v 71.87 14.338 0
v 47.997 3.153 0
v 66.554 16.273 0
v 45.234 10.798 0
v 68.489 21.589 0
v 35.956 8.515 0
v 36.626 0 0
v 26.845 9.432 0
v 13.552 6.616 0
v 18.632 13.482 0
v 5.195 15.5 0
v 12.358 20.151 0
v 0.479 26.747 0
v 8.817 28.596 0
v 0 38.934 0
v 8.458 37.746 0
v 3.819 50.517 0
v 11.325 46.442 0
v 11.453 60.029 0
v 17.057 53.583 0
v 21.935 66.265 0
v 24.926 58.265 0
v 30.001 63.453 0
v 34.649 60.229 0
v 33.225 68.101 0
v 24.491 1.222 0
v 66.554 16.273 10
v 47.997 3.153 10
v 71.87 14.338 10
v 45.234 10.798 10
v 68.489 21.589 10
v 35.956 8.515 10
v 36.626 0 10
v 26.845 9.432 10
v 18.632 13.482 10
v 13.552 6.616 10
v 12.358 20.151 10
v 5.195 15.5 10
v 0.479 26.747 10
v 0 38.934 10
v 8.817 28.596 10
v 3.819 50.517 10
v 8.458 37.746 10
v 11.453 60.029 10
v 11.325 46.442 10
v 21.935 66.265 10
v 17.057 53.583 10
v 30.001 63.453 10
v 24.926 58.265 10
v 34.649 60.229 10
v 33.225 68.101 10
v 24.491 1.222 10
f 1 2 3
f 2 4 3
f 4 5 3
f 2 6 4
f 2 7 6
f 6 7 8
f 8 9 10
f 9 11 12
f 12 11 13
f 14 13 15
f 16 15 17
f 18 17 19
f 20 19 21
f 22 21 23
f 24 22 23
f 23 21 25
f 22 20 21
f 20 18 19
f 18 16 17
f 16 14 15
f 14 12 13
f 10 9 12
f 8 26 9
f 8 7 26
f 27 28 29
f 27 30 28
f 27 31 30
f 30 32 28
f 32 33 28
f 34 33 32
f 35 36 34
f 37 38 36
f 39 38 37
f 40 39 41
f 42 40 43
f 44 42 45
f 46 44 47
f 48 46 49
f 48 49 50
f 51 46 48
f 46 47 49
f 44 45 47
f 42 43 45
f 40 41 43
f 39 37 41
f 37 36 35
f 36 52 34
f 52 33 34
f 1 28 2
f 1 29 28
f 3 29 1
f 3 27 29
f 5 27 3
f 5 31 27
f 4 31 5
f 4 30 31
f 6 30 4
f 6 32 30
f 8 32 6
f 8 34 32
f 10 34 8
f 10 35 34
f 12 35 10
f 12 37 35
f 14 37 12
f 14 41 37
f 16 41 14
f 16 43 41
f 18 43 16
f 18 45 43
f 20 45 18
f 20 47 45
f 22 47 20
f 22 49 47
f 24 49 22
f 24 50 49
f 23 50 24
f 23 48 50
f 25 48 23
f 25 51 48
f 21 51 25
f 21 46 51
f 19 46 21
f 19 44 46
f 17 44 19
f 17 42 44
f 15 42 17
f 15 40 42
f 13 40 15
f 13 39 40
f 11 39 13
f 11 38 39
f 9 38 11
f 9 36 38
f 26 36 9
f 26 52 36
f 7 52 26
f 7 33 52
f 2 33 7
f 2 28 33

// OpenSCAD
$fn = 32;

// ----------------------------------------------------------------------
// Hook plate: curl radius 30 mm over 205 degrees, 8 mm thick band
// ----------------------------------------------------------------------

// --- parameters (mm) ---
profile_height = 10;      // extrusion height
profile_points = 26;      // points of the closed outline

profile = [[30.001, 63.453], [33.225, 68.101], [21.935, 66.265], [11.453, 60.029], [3.819, 50.517], [0, 38.934], [0.479, 26.747], [5.195, 15.5], [13.552, 6.616], [24.491, 1.222], [36.626, 0], [47.997, 3.153], [71.87, 14.338], [66.554, 16.273], [68.489, 21.589], [45.234, 10.798], [35.956, 8.515], [26.845, 9.432], [18.632, 13.482], [12.358, 20.151], [8.817, 28.596], [8.458, 37.746], [11.325, 46.442], [17.057, 53.583], [24.926, 58.265], [34.649, 60.229]];  // single closed polygon, 26 points, counter clockwise

// --- the one profile operation ---
linear_extrude(height = profile_height) polygon(points = profile);
